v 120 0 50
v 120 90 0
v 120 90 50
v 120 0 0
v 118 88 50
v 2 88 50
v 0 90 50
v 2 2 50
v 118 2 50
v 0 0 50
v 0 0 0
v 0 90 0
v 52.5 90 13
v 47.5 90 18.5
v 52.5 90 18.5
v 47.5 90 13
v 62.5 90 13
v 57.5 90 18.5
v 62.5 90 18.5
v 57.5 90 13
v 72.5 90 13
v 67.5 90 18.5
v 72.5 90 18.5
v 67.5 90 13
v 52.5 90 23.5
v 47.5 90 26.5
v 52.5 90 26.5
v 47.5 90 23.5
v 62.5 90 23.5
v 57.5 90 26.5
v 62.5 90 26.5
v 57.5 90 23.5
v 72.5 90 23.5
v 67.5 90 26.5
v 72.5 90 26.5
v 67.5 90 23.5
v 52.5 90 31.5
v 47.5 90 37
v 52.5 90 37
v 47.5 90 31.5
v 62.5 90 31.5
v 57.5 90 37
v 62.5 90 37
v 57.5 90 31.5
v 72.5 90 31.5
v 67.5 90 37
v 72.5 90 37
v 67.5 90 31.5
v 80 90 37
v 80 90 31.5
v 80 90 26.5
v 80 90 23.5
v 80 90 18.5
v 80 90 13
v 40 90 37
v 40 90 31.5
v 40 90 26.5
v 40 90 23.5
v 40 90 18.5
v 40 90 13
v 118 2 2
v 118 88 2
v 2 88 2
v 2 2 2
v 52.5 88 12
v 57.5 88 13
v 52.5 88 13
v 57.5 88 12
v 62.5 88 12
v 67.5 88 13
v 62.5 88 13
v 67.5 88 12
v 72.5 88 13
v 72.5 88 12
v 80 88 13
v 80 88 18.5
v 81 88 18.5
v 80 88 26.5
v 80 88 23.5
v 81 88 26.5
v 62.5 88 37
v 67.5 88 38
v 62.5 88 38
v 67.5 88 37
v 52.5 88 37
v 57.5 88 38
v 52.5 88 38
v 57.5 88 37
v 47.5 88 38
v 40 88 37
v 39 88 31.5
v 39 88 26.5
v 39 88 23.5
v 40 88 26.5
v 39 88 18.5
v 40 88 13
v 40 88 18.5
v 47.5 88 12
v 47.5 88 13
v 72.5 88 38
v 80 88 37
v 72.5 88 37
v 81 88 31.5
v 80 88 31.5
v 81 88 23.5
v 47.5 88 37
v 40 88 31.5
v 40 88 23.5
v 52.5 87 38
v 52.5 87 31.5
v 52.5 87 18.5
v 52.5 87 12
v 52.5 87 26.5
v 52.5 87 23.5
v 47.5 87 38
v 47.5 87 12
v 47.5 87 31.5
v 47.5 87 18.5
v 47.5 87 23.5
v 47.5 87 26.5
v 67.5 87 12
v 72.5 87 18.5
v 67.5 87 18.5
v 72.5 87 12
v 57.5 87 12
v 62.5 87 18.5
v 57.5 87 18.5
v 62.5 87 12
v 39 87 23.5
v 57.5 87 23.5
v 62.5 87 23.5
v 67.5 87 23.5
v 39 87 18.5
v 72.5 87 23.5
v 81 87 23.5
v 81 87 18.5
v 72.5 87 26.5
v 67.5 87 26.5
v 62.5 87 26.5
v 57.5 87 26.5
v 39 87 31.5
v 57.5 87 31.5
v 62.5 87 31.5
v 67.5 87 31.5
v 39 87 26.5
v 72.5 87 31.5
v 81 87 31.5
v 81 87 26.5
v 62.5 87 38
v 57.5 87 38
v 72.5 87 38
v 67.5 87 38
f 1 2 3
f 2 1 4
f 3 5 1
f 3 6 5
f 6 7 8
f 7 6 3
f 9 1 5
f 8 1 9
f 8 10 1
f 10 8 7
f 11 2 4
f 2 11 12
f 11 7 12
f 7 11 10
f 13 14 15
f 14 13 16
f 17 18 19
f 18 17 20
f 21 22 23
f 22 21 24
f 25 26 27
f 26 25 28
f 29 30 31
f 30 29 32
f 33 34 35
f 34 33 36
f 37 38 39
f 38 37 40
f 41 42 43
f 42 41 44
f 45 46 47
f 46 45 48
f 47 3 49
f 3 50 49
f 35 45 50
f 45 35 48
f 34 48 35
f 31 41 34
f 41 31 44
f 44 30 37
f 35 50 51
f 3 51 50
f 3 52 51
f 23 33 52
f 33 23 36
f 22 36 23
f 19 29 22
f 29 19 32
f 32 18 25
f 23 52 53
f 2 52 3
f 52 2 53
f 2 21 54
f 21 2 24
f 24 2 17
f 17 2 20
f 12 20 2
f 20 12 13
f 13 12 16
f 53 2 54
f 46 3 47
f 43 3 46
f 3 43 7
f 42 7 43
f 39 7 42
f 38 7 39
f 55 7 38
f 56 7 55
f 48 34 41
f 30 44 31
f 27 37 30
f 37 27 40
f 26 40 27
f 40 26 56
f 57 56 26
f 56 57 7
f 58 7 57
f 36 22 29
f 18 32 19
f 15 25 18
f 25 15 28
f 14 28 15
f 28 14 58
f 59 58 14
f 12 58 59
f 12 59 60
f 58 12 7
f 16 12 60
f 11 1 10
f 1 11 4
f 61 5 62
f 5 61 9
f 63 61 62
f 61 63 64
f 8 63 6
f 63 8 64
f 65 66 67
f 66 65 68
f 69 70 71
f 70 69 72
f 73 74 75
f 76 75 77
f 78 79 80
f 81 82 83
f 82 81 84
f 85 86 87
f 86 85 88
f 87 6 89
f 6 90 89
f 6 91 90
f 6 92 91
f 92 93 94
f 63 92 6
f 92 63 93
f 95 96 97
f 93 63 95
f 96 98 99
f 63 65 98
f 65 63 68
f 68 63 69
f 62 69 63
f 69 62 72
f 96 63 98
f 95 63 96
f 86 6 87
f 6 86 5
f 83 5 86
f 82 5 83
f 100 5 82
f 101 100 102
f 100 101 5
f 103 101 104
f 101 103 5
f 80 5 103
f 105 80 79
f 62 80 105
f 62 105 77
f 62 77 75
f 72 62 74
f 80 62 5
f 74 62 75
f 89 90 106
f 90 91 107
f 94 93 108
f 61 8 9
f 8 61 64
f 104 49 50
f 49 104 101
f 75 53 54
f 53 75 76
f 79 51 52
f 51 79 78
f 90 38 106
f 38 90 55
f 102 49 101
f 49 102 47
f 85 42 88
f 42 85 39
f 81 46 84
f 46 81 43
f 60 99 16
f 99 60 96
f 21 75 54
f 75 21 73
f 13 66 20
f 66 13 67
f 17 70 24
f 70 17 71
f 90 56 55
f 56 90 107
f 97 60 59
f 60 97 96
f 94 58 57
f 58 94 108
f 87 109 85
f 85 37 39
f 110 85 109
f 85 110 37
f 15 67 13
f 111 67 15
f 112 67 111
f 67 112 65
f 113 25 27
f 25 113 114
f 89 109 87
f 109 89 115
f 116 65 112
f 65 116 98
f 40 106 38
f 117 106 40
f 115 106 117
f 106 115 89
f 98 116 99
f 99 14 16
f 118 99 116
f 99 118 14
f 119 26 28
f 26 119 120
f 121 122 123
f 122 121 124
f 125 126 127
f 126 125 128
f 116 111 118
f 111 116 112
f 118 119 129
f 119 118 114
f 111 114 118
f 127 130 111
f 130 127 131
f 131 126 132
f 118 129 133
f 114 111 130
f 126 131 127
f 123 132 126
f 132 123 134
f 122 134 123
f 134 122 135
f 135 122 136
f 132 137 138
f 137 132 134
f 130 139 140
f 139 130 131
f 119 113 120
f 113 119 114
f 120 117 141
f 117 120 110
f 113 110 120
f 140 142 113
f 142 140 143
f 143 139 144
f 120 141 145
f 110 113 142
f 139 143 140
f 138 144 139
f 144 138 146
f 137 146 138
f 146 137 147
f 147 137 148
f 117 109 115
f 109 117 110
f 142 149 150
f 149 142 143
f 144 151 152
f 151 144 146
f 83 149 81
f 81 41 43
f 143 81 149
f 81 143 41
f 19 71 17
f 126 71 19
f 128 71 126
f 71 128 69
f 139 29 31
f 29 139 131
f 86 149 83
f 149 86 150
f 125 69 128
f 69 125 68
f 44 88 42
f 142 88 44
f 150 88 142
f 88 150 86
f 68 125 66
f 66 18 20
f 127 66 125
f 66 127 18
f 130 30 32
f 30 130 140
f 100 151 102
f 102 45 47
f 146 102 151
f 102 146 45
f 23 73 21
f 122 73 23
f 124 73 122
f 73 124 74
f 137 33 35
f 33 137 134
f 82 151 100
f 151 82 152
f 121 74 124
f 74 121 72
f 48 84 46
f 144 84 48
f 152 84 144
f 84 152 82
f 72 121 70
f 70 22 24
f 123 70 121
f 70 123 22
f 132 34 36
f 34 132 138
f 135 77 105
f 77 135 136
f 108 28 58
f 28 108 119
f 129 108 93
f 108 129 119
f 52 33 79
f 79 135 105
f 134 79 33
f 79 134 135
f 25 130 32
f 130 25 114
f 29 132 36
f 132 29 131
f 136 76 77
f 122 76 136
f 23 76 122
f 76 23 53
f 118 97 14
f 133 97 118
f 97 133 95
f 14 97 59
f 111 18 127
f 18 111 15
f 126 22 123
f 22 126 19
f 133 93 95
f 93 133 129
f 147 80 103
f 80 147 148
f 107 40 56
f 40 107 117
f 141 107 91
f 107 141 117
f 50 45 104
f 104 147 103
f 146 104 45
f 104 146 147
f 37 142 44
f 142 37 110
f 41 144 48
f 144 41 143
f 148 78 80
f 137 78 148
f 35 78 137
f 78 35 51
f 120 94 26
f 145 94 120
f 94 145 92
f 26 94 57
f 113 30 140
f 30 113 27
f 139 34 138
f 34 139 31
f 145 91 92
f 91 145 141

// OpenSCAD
$fn = 32;

// ----------------------------------------------------------------------
// Vent box: crossgrid enclosure
// ----------------------------------------------------------------------

// --- parameters (mm) ---
box_l = 120;              // box length, X
box_w = 90;               // box width, Y
box_h = 50;               // box height, Z
wall_t = 2;               // shell wall thickness
win_l = 40;               // vent window width, X
win_h = 24;               // vent window height, Z
bar_w = 5;                // grid bar width
n_v = 3;                  // vertical bar count
n_h = 2;                  // horizontal bar count

win_z0 = (box_h - win_h) / 2;  // window lower edge Z
v_step = win_l / (n_v + 1);  // vertical bar step
h_step = win_h / (n_h + 1);  // horizontal bar step

difference() {
  union() {
    difference() {
      cube([box_l, box_w, box_h]);
  translate([wall_t, wall_t, wall_t])
    cube([box_l - 2 * wall_t, box_w - 2 * wall_t, box_h]);
  translate([(box_l - win_l) / 2, box_w - wall_t - 1, win_z0])
    cube([win_l, wall_t + 2, win_h]);
    }
    for (i = [1 : n_v])
      translate([(box_l - win_l) / 2 + i * v_step - bar_w / 2,
                 box_w - wall_t - 1, win_z0 - 1])
        cube([bar_w, wall_t + 1, win_h + 2]);
    for (i = [1 : n_h])
      translate([(box_l - win_l) / 2 - 1, box_w - wall_t - 1,
                 win_z0 + i * h_step - bar_w / 2])
        cube([win_l + 2, wall_t + 1, bar_w]);
  }
}
